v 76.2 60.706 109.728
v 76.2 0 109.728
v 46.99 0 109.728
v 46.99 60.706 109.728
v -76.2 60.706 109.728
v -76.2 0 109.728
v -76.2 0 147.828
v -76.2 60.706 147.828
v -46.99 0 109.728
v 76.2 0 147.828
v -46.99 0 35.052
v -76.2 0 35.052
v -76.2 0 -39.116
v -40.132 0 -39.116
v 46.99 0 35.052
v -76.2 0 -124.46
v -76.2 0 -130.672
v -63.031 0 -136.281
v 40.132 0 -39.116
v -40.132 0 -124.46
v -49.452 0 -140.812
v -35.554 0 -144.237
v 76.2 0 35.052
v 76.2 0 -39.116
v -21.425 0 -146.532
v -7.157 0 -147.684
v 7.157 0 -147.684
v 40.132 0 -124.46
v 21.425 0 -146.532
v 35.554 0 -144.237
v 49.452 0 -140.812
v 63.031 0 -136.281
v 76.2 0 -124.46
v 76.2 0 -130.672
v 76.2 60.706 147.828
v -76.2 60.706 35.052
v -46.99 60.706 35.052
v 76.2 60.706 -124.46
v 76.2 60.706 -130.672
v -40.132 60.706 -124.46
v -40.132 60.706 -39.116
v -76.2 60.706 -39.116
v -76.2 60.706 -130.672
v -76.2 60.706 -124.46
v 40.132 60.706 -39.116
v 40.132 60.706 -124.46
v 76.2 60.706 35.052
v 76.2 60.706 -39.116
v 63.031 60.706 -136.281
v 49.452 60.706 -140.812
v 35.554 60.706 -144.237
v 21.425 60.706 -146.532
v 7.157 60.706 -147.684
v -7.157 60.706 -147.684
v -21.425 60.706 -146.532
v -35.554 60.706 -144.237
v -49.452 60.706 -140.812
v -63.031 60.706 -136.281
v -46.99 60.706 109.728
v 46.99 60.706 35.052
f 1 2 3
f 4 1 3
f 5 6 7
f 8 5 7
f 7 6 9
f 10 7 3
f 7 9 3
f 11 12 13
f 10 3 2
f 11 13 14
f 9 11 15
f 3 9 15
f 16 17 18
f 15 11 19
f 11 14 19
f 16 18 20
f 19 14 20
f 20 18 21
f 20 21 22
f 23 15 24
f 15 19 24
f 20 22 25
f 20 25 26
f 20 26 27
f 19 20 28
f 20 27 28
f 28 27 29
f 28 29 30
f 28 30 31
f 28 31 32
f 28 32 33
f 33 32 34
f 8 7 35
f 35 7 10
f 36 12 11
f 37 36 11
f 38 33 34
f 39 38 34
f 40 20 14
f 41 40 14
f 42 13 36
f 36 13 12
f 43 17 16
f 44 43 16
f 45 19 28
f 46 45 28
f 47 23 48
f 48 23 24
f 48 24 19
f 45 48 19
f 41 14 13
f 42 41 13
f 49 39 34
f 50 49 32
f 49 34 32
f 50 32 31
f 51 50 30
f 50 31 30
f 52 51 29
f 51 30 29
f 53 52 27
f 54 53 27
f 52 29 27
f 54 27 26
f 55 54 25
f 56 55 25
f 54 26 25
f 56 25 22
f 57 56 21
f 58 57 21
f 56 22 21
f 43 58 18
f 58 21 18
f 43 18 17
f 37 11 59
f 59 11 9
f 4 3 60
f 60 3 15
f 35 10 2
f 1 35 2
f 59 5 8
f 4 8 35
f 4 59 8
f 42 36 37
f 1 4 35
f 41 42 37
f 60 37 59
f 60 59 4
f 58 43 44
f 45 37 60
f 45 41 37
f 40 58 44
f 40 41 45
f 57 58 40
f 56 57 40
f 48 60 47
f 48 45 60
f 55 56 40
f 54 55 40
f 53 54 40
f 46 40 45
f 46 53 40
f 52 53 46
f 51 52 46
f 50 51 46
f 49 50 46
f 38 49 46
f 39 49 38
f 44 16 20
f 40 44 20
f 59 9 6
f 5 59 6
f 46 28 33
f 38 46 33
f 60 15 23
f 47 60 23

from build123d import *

# Parameters (mm, degrees)
BOSS_EXTRUDE1_DEPTH = 60.706


with BuildPart() as part:
    # Sketch2 → Boss-Extrude1 (new body)
    with BuildSketch(Plane(origin=(0, 0, 0), x_dir=(1, 0, 0), z_dir=(0, 1, 0))):
        with BuildLine():
            Line((-76.2, -147.828), (76.2, -147.828))
            Line((76.2, -147.828), (76.2, -109.728))
            Line((76.2, -109.728), (46.99, -109.728))
            Line((46.99, -109.728), (46.99, -35.052))
            Line((46.99, -35.052), (76.2, -35.052))
            Line((76.2, -35.052), (76.2, 39.116))
            Line((76.2, 39.116), (40.132, 39.116))
            Line((40.132, 39.116), (40.132, 124.46))
            Line((40.132, 124.46), (76.2, 124.46))
            Line((76.2, 124.46), (76.2, 130.671705137))
            ThreePointArc((76.2, 130.671705137), (0, 147.828), (-76.2, 130.671705137))
            Line((-76.2, 130.671705137), (-76.2, 124.46))
            Line((-76.2, 124.46), (-40.132, 124.46))
            Line((-40.132, 124.46), (-40.132, 39.116))
            Line((-40.132, 39.116), (-76.2, 39.116))
            Line((-76.2, 39.116), (-76.2, -35.052))
            Line((-76.2, -35.052), (-46.99, -35.052))
            Line((-46.99, -35.052), (-46.99, -109.728))
            Line((-46.99, -109.728), (-76.2, -109.728))
            Line((-76.2, -109.728), (-76.2, -147.828))
        make_face()
    extrude(amount=BOSS_EXTRUDE1_DEPTH)


solid = part.part
